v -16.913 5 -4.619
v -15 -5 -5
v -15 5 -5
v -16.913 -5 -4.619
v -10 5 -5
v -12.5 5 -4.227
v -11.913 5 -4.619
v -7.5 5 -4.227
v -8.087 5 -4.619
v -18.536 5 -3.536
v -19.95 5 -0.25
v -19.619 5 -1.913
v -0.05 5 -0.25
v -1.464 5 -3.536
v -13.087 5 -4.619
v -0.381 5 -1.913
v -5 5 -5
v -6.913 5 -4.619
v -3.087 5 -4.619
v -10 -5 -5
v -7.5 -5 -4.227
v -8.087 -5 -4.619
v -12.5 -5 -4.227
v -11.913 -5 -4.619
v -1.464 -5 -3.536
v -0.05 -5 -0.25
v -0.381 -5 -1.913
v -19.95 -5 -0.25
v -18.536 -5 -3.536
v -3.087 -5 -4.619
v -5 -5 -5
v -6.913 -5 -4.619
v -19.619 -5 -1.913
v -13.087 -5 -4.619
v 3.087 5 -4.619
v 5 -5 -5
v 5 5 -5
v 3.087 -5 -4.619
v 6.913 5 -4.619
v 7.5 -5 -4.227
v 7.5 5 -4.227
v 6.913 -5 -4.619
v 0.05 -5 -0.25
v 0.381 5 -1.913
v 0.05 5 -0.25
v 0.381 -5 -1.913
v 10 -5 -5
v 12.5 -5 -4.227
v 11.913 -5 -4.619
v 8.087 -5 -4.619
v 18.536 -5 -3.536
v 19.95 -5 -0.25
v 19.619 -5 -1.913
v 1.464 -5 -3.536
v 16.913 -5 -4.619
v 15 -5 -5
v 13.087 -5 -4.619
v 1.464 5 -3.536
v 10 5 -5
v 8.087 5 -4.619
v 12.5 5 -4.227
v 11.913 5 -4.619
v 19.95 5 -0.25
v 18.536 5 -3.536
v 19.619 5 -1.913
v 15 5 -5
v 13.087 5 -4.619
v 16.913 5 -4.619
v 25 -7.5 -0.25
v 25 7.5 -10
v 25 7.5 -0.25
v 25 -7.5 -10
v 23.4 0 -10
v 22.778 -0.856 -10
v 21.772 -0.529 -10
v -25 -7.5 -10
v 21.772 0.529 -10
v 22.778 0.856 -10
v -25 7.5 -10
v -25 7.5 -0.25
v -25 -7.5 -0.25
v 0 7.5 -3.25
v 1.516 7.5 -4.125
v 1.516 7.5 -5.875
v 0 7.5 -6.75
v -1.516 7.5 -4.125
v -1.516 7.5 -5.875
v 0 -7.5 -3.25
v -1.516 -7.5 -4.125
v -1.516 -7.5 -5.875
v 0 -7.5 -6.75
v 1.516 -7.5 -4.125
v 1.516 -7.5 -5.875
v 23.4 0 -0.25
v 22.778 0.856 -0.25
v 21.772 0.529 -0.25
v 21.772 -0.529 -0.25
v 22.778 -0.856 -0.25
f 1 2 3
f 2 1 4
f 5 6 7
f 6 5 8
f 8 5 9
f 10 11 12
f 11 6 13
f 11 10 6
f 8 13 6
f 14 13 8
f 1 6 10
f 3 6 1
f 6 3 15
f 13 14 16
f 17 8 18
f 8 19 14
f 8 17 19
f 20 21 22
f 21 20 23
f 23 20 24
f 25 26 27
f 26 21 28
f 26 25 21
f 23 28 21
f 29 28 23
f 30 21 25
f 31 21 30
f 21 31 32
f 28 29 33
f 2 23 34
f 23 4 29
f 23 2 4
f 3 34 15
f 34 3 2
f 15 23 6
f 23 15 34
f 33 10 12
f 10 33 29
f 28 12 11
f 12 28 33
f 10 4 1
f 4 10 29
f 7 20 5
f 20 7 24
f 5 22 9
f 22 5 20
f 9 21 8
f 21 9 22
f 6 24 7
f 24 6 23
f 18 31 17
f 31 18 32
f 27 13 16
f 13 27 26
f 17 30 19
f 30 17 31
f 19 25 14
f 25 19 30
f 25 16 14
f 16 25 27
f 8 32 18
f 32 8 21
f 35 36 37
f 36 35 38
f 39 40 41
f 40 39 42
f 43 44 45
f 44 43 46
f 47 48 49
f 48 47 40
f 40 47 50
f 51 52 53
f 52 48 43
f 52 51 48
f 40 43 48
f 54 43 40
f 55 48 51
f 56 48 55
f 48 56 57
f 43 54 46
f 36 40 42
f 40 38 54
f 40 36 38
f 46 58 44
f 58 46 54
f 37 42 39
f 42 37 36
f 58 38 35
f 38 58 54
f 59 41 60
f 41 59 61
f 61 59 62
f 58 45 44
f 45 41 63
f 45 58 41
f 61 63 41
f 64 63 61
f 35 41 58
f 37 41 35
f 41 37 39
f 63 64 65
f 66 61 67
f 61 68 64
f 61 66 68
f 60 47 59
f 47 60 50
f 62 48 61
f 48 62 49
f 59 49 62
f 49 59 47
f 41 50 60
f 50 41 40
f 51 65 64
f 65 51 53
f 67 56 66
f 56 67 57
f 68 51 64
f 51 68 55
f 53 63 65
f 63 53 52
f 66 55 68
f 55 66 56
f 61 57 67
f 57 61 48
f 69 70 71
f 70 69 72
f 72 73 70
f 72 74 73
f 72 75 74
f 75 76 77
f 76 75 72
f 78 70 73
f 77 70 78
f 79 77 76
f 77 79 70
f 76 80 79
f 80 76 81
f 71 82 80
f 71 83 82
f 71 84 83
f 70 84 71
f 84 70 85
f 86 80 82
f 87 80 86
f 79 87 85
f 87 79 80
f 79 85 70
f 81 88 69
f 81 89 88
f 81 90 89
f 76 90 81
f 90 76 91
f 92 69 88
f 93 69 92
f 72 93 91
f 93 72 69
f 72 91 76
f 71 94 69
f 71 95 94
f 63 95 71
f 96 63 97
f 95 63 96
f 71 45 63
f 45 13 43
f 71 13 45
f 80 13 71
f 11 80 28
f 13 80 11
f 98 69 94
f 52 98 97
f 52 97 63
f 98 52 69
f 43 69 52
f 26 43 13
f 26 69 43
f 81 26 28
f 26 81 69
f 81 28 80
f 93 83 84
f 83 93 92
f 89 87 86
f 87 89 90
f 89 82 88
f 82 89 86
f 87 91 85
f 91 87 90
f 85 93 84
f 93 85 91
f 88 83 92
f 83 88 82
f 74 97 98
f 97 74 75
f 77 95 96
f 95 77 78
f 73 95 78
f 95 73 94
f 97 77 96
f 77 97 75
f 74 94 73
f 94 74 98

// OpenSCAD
magnet_h=10;
magnet_d=10;

screw=3; // M3 screw
screw_plastic=1.8; // plastic hole dia

clr_magnet_d=0.5; // diameter clearance
clr_screw_hole=0.5; // hole bit bigger
clr_screw_step=1; // screw spacing clearance

tube_wall=1.5; // wall thickness
tube_len=150; // tube length


screw_step=magnet_h+screw+clr_screw_step;

// screw_step=2*screw;

cylinder_faces=32;

holder_depth=15;
holder_width=50;
holder_height=20;
magnet_step=5;
magnet_height=10;
holder_clearance=0.5;

module magnet_tube()
{
  inner_d=magnet_d+clr_magnet_d;
  outer_d=inner_d+tube_wall;
  steps=floor(tube_len/screw_step/2)*2;
  difference()
  {
    cylinder(d=outer_d,h=tube_len,$fn=cylinder_faces,center=true);
    // tube = inside empty
    cylinder(d=inner_d,h=tube_len+0.01,$fn=cylinder_faces,center=true);
    // adjustment holes
    for(i=[-2*steps:2*steps])
      translate([0,0,i*screw_step])
        rotate([90,0,0])
          rotate([0,0,90])
          cylinder(d=screw+clr_screw_hole,h=outer_d*2,$fn=6,center=true);
        
  }
}

module side_holder()
{
  cube_len=54;
  cube_h=15;
  steps=floor(cube_len/screw_step/2)*2;
  difference()
  {
    cube([cube_len,cube_h,cube_h],center=true);
    // adjustment holes
    for(i=[-2*steps:2*steps])
    translate([i*screw_step,0,0])
        rotate([0,0,0])
          cylinder(d=screw_plastic+clr_screw_hole,h=cube_h*2,center=true);
    // hole for threaded rod
    rotate([90,0,0])
      rotate([0,0,90])
      cylinder(d=screw+clr_screw_hole,h=cube_h*2,$fn=6,center=true);
  }
}

module magnet_holder(upper=0,lower=1)
{
  difference()
  {
    cube([holder_width,holder_depth,holder_height],center=true);
    // cut slit between
    translate([0,0,-holder_height/2+magnet_height])
      cube([
            holder_width+0.01,
            holder_depth+0.01,
            holder_clearance],
      center=true);
    // no upper side
    if(upper<0.5)
      translate([0,0,-holder_height/2+magnet_height+holder_height/2])
      cube([
            holder_width+0.01,
            holder_depth+0.01,
            holder_height],
      center=true);
    // no lower side
    if(lower<0.5)
      translate([0,0,-holder_height/2+magnet_height-holder_height/2])
      cube([
            holder_width+0.01,
            holder_depth+0.01,
            holder_height],
      center=true);
    // magnet placeholders
    steps=floor(holder_width/magnet_step/2)*2-4;
    // adjustment holes
    for(i=[-steps/2:steps/2])
        if(i < -0.5 || i > 0.5)
    translate([i*magnet_step,0,-holder_height/2+magnet_height])
        rotate([90,0,0])
          cylinder(d=magnet_d,h=magnet_h,center=true);
    // rod hole
    // hole for threaded rod
    translate([0,0,-holder_height/2+magnet_height/2])
    rotate([90,0,0])
      rotate([0,0,90])
      cylinder(d=screw+clr_screw_hole,h=holder_depth+0.01,$fn=6,center=true);
    // screw head hole
    translate([holder_width/2-magnet_step/2,0,0])
        cylinder(d=1.8,h=100,center=true);
  }
}

if(0)
translate([0,0,15])
rotate([90,0,0])
magnet_tube();

//magnet_tube();
//side_holder();
magnet_holder();
